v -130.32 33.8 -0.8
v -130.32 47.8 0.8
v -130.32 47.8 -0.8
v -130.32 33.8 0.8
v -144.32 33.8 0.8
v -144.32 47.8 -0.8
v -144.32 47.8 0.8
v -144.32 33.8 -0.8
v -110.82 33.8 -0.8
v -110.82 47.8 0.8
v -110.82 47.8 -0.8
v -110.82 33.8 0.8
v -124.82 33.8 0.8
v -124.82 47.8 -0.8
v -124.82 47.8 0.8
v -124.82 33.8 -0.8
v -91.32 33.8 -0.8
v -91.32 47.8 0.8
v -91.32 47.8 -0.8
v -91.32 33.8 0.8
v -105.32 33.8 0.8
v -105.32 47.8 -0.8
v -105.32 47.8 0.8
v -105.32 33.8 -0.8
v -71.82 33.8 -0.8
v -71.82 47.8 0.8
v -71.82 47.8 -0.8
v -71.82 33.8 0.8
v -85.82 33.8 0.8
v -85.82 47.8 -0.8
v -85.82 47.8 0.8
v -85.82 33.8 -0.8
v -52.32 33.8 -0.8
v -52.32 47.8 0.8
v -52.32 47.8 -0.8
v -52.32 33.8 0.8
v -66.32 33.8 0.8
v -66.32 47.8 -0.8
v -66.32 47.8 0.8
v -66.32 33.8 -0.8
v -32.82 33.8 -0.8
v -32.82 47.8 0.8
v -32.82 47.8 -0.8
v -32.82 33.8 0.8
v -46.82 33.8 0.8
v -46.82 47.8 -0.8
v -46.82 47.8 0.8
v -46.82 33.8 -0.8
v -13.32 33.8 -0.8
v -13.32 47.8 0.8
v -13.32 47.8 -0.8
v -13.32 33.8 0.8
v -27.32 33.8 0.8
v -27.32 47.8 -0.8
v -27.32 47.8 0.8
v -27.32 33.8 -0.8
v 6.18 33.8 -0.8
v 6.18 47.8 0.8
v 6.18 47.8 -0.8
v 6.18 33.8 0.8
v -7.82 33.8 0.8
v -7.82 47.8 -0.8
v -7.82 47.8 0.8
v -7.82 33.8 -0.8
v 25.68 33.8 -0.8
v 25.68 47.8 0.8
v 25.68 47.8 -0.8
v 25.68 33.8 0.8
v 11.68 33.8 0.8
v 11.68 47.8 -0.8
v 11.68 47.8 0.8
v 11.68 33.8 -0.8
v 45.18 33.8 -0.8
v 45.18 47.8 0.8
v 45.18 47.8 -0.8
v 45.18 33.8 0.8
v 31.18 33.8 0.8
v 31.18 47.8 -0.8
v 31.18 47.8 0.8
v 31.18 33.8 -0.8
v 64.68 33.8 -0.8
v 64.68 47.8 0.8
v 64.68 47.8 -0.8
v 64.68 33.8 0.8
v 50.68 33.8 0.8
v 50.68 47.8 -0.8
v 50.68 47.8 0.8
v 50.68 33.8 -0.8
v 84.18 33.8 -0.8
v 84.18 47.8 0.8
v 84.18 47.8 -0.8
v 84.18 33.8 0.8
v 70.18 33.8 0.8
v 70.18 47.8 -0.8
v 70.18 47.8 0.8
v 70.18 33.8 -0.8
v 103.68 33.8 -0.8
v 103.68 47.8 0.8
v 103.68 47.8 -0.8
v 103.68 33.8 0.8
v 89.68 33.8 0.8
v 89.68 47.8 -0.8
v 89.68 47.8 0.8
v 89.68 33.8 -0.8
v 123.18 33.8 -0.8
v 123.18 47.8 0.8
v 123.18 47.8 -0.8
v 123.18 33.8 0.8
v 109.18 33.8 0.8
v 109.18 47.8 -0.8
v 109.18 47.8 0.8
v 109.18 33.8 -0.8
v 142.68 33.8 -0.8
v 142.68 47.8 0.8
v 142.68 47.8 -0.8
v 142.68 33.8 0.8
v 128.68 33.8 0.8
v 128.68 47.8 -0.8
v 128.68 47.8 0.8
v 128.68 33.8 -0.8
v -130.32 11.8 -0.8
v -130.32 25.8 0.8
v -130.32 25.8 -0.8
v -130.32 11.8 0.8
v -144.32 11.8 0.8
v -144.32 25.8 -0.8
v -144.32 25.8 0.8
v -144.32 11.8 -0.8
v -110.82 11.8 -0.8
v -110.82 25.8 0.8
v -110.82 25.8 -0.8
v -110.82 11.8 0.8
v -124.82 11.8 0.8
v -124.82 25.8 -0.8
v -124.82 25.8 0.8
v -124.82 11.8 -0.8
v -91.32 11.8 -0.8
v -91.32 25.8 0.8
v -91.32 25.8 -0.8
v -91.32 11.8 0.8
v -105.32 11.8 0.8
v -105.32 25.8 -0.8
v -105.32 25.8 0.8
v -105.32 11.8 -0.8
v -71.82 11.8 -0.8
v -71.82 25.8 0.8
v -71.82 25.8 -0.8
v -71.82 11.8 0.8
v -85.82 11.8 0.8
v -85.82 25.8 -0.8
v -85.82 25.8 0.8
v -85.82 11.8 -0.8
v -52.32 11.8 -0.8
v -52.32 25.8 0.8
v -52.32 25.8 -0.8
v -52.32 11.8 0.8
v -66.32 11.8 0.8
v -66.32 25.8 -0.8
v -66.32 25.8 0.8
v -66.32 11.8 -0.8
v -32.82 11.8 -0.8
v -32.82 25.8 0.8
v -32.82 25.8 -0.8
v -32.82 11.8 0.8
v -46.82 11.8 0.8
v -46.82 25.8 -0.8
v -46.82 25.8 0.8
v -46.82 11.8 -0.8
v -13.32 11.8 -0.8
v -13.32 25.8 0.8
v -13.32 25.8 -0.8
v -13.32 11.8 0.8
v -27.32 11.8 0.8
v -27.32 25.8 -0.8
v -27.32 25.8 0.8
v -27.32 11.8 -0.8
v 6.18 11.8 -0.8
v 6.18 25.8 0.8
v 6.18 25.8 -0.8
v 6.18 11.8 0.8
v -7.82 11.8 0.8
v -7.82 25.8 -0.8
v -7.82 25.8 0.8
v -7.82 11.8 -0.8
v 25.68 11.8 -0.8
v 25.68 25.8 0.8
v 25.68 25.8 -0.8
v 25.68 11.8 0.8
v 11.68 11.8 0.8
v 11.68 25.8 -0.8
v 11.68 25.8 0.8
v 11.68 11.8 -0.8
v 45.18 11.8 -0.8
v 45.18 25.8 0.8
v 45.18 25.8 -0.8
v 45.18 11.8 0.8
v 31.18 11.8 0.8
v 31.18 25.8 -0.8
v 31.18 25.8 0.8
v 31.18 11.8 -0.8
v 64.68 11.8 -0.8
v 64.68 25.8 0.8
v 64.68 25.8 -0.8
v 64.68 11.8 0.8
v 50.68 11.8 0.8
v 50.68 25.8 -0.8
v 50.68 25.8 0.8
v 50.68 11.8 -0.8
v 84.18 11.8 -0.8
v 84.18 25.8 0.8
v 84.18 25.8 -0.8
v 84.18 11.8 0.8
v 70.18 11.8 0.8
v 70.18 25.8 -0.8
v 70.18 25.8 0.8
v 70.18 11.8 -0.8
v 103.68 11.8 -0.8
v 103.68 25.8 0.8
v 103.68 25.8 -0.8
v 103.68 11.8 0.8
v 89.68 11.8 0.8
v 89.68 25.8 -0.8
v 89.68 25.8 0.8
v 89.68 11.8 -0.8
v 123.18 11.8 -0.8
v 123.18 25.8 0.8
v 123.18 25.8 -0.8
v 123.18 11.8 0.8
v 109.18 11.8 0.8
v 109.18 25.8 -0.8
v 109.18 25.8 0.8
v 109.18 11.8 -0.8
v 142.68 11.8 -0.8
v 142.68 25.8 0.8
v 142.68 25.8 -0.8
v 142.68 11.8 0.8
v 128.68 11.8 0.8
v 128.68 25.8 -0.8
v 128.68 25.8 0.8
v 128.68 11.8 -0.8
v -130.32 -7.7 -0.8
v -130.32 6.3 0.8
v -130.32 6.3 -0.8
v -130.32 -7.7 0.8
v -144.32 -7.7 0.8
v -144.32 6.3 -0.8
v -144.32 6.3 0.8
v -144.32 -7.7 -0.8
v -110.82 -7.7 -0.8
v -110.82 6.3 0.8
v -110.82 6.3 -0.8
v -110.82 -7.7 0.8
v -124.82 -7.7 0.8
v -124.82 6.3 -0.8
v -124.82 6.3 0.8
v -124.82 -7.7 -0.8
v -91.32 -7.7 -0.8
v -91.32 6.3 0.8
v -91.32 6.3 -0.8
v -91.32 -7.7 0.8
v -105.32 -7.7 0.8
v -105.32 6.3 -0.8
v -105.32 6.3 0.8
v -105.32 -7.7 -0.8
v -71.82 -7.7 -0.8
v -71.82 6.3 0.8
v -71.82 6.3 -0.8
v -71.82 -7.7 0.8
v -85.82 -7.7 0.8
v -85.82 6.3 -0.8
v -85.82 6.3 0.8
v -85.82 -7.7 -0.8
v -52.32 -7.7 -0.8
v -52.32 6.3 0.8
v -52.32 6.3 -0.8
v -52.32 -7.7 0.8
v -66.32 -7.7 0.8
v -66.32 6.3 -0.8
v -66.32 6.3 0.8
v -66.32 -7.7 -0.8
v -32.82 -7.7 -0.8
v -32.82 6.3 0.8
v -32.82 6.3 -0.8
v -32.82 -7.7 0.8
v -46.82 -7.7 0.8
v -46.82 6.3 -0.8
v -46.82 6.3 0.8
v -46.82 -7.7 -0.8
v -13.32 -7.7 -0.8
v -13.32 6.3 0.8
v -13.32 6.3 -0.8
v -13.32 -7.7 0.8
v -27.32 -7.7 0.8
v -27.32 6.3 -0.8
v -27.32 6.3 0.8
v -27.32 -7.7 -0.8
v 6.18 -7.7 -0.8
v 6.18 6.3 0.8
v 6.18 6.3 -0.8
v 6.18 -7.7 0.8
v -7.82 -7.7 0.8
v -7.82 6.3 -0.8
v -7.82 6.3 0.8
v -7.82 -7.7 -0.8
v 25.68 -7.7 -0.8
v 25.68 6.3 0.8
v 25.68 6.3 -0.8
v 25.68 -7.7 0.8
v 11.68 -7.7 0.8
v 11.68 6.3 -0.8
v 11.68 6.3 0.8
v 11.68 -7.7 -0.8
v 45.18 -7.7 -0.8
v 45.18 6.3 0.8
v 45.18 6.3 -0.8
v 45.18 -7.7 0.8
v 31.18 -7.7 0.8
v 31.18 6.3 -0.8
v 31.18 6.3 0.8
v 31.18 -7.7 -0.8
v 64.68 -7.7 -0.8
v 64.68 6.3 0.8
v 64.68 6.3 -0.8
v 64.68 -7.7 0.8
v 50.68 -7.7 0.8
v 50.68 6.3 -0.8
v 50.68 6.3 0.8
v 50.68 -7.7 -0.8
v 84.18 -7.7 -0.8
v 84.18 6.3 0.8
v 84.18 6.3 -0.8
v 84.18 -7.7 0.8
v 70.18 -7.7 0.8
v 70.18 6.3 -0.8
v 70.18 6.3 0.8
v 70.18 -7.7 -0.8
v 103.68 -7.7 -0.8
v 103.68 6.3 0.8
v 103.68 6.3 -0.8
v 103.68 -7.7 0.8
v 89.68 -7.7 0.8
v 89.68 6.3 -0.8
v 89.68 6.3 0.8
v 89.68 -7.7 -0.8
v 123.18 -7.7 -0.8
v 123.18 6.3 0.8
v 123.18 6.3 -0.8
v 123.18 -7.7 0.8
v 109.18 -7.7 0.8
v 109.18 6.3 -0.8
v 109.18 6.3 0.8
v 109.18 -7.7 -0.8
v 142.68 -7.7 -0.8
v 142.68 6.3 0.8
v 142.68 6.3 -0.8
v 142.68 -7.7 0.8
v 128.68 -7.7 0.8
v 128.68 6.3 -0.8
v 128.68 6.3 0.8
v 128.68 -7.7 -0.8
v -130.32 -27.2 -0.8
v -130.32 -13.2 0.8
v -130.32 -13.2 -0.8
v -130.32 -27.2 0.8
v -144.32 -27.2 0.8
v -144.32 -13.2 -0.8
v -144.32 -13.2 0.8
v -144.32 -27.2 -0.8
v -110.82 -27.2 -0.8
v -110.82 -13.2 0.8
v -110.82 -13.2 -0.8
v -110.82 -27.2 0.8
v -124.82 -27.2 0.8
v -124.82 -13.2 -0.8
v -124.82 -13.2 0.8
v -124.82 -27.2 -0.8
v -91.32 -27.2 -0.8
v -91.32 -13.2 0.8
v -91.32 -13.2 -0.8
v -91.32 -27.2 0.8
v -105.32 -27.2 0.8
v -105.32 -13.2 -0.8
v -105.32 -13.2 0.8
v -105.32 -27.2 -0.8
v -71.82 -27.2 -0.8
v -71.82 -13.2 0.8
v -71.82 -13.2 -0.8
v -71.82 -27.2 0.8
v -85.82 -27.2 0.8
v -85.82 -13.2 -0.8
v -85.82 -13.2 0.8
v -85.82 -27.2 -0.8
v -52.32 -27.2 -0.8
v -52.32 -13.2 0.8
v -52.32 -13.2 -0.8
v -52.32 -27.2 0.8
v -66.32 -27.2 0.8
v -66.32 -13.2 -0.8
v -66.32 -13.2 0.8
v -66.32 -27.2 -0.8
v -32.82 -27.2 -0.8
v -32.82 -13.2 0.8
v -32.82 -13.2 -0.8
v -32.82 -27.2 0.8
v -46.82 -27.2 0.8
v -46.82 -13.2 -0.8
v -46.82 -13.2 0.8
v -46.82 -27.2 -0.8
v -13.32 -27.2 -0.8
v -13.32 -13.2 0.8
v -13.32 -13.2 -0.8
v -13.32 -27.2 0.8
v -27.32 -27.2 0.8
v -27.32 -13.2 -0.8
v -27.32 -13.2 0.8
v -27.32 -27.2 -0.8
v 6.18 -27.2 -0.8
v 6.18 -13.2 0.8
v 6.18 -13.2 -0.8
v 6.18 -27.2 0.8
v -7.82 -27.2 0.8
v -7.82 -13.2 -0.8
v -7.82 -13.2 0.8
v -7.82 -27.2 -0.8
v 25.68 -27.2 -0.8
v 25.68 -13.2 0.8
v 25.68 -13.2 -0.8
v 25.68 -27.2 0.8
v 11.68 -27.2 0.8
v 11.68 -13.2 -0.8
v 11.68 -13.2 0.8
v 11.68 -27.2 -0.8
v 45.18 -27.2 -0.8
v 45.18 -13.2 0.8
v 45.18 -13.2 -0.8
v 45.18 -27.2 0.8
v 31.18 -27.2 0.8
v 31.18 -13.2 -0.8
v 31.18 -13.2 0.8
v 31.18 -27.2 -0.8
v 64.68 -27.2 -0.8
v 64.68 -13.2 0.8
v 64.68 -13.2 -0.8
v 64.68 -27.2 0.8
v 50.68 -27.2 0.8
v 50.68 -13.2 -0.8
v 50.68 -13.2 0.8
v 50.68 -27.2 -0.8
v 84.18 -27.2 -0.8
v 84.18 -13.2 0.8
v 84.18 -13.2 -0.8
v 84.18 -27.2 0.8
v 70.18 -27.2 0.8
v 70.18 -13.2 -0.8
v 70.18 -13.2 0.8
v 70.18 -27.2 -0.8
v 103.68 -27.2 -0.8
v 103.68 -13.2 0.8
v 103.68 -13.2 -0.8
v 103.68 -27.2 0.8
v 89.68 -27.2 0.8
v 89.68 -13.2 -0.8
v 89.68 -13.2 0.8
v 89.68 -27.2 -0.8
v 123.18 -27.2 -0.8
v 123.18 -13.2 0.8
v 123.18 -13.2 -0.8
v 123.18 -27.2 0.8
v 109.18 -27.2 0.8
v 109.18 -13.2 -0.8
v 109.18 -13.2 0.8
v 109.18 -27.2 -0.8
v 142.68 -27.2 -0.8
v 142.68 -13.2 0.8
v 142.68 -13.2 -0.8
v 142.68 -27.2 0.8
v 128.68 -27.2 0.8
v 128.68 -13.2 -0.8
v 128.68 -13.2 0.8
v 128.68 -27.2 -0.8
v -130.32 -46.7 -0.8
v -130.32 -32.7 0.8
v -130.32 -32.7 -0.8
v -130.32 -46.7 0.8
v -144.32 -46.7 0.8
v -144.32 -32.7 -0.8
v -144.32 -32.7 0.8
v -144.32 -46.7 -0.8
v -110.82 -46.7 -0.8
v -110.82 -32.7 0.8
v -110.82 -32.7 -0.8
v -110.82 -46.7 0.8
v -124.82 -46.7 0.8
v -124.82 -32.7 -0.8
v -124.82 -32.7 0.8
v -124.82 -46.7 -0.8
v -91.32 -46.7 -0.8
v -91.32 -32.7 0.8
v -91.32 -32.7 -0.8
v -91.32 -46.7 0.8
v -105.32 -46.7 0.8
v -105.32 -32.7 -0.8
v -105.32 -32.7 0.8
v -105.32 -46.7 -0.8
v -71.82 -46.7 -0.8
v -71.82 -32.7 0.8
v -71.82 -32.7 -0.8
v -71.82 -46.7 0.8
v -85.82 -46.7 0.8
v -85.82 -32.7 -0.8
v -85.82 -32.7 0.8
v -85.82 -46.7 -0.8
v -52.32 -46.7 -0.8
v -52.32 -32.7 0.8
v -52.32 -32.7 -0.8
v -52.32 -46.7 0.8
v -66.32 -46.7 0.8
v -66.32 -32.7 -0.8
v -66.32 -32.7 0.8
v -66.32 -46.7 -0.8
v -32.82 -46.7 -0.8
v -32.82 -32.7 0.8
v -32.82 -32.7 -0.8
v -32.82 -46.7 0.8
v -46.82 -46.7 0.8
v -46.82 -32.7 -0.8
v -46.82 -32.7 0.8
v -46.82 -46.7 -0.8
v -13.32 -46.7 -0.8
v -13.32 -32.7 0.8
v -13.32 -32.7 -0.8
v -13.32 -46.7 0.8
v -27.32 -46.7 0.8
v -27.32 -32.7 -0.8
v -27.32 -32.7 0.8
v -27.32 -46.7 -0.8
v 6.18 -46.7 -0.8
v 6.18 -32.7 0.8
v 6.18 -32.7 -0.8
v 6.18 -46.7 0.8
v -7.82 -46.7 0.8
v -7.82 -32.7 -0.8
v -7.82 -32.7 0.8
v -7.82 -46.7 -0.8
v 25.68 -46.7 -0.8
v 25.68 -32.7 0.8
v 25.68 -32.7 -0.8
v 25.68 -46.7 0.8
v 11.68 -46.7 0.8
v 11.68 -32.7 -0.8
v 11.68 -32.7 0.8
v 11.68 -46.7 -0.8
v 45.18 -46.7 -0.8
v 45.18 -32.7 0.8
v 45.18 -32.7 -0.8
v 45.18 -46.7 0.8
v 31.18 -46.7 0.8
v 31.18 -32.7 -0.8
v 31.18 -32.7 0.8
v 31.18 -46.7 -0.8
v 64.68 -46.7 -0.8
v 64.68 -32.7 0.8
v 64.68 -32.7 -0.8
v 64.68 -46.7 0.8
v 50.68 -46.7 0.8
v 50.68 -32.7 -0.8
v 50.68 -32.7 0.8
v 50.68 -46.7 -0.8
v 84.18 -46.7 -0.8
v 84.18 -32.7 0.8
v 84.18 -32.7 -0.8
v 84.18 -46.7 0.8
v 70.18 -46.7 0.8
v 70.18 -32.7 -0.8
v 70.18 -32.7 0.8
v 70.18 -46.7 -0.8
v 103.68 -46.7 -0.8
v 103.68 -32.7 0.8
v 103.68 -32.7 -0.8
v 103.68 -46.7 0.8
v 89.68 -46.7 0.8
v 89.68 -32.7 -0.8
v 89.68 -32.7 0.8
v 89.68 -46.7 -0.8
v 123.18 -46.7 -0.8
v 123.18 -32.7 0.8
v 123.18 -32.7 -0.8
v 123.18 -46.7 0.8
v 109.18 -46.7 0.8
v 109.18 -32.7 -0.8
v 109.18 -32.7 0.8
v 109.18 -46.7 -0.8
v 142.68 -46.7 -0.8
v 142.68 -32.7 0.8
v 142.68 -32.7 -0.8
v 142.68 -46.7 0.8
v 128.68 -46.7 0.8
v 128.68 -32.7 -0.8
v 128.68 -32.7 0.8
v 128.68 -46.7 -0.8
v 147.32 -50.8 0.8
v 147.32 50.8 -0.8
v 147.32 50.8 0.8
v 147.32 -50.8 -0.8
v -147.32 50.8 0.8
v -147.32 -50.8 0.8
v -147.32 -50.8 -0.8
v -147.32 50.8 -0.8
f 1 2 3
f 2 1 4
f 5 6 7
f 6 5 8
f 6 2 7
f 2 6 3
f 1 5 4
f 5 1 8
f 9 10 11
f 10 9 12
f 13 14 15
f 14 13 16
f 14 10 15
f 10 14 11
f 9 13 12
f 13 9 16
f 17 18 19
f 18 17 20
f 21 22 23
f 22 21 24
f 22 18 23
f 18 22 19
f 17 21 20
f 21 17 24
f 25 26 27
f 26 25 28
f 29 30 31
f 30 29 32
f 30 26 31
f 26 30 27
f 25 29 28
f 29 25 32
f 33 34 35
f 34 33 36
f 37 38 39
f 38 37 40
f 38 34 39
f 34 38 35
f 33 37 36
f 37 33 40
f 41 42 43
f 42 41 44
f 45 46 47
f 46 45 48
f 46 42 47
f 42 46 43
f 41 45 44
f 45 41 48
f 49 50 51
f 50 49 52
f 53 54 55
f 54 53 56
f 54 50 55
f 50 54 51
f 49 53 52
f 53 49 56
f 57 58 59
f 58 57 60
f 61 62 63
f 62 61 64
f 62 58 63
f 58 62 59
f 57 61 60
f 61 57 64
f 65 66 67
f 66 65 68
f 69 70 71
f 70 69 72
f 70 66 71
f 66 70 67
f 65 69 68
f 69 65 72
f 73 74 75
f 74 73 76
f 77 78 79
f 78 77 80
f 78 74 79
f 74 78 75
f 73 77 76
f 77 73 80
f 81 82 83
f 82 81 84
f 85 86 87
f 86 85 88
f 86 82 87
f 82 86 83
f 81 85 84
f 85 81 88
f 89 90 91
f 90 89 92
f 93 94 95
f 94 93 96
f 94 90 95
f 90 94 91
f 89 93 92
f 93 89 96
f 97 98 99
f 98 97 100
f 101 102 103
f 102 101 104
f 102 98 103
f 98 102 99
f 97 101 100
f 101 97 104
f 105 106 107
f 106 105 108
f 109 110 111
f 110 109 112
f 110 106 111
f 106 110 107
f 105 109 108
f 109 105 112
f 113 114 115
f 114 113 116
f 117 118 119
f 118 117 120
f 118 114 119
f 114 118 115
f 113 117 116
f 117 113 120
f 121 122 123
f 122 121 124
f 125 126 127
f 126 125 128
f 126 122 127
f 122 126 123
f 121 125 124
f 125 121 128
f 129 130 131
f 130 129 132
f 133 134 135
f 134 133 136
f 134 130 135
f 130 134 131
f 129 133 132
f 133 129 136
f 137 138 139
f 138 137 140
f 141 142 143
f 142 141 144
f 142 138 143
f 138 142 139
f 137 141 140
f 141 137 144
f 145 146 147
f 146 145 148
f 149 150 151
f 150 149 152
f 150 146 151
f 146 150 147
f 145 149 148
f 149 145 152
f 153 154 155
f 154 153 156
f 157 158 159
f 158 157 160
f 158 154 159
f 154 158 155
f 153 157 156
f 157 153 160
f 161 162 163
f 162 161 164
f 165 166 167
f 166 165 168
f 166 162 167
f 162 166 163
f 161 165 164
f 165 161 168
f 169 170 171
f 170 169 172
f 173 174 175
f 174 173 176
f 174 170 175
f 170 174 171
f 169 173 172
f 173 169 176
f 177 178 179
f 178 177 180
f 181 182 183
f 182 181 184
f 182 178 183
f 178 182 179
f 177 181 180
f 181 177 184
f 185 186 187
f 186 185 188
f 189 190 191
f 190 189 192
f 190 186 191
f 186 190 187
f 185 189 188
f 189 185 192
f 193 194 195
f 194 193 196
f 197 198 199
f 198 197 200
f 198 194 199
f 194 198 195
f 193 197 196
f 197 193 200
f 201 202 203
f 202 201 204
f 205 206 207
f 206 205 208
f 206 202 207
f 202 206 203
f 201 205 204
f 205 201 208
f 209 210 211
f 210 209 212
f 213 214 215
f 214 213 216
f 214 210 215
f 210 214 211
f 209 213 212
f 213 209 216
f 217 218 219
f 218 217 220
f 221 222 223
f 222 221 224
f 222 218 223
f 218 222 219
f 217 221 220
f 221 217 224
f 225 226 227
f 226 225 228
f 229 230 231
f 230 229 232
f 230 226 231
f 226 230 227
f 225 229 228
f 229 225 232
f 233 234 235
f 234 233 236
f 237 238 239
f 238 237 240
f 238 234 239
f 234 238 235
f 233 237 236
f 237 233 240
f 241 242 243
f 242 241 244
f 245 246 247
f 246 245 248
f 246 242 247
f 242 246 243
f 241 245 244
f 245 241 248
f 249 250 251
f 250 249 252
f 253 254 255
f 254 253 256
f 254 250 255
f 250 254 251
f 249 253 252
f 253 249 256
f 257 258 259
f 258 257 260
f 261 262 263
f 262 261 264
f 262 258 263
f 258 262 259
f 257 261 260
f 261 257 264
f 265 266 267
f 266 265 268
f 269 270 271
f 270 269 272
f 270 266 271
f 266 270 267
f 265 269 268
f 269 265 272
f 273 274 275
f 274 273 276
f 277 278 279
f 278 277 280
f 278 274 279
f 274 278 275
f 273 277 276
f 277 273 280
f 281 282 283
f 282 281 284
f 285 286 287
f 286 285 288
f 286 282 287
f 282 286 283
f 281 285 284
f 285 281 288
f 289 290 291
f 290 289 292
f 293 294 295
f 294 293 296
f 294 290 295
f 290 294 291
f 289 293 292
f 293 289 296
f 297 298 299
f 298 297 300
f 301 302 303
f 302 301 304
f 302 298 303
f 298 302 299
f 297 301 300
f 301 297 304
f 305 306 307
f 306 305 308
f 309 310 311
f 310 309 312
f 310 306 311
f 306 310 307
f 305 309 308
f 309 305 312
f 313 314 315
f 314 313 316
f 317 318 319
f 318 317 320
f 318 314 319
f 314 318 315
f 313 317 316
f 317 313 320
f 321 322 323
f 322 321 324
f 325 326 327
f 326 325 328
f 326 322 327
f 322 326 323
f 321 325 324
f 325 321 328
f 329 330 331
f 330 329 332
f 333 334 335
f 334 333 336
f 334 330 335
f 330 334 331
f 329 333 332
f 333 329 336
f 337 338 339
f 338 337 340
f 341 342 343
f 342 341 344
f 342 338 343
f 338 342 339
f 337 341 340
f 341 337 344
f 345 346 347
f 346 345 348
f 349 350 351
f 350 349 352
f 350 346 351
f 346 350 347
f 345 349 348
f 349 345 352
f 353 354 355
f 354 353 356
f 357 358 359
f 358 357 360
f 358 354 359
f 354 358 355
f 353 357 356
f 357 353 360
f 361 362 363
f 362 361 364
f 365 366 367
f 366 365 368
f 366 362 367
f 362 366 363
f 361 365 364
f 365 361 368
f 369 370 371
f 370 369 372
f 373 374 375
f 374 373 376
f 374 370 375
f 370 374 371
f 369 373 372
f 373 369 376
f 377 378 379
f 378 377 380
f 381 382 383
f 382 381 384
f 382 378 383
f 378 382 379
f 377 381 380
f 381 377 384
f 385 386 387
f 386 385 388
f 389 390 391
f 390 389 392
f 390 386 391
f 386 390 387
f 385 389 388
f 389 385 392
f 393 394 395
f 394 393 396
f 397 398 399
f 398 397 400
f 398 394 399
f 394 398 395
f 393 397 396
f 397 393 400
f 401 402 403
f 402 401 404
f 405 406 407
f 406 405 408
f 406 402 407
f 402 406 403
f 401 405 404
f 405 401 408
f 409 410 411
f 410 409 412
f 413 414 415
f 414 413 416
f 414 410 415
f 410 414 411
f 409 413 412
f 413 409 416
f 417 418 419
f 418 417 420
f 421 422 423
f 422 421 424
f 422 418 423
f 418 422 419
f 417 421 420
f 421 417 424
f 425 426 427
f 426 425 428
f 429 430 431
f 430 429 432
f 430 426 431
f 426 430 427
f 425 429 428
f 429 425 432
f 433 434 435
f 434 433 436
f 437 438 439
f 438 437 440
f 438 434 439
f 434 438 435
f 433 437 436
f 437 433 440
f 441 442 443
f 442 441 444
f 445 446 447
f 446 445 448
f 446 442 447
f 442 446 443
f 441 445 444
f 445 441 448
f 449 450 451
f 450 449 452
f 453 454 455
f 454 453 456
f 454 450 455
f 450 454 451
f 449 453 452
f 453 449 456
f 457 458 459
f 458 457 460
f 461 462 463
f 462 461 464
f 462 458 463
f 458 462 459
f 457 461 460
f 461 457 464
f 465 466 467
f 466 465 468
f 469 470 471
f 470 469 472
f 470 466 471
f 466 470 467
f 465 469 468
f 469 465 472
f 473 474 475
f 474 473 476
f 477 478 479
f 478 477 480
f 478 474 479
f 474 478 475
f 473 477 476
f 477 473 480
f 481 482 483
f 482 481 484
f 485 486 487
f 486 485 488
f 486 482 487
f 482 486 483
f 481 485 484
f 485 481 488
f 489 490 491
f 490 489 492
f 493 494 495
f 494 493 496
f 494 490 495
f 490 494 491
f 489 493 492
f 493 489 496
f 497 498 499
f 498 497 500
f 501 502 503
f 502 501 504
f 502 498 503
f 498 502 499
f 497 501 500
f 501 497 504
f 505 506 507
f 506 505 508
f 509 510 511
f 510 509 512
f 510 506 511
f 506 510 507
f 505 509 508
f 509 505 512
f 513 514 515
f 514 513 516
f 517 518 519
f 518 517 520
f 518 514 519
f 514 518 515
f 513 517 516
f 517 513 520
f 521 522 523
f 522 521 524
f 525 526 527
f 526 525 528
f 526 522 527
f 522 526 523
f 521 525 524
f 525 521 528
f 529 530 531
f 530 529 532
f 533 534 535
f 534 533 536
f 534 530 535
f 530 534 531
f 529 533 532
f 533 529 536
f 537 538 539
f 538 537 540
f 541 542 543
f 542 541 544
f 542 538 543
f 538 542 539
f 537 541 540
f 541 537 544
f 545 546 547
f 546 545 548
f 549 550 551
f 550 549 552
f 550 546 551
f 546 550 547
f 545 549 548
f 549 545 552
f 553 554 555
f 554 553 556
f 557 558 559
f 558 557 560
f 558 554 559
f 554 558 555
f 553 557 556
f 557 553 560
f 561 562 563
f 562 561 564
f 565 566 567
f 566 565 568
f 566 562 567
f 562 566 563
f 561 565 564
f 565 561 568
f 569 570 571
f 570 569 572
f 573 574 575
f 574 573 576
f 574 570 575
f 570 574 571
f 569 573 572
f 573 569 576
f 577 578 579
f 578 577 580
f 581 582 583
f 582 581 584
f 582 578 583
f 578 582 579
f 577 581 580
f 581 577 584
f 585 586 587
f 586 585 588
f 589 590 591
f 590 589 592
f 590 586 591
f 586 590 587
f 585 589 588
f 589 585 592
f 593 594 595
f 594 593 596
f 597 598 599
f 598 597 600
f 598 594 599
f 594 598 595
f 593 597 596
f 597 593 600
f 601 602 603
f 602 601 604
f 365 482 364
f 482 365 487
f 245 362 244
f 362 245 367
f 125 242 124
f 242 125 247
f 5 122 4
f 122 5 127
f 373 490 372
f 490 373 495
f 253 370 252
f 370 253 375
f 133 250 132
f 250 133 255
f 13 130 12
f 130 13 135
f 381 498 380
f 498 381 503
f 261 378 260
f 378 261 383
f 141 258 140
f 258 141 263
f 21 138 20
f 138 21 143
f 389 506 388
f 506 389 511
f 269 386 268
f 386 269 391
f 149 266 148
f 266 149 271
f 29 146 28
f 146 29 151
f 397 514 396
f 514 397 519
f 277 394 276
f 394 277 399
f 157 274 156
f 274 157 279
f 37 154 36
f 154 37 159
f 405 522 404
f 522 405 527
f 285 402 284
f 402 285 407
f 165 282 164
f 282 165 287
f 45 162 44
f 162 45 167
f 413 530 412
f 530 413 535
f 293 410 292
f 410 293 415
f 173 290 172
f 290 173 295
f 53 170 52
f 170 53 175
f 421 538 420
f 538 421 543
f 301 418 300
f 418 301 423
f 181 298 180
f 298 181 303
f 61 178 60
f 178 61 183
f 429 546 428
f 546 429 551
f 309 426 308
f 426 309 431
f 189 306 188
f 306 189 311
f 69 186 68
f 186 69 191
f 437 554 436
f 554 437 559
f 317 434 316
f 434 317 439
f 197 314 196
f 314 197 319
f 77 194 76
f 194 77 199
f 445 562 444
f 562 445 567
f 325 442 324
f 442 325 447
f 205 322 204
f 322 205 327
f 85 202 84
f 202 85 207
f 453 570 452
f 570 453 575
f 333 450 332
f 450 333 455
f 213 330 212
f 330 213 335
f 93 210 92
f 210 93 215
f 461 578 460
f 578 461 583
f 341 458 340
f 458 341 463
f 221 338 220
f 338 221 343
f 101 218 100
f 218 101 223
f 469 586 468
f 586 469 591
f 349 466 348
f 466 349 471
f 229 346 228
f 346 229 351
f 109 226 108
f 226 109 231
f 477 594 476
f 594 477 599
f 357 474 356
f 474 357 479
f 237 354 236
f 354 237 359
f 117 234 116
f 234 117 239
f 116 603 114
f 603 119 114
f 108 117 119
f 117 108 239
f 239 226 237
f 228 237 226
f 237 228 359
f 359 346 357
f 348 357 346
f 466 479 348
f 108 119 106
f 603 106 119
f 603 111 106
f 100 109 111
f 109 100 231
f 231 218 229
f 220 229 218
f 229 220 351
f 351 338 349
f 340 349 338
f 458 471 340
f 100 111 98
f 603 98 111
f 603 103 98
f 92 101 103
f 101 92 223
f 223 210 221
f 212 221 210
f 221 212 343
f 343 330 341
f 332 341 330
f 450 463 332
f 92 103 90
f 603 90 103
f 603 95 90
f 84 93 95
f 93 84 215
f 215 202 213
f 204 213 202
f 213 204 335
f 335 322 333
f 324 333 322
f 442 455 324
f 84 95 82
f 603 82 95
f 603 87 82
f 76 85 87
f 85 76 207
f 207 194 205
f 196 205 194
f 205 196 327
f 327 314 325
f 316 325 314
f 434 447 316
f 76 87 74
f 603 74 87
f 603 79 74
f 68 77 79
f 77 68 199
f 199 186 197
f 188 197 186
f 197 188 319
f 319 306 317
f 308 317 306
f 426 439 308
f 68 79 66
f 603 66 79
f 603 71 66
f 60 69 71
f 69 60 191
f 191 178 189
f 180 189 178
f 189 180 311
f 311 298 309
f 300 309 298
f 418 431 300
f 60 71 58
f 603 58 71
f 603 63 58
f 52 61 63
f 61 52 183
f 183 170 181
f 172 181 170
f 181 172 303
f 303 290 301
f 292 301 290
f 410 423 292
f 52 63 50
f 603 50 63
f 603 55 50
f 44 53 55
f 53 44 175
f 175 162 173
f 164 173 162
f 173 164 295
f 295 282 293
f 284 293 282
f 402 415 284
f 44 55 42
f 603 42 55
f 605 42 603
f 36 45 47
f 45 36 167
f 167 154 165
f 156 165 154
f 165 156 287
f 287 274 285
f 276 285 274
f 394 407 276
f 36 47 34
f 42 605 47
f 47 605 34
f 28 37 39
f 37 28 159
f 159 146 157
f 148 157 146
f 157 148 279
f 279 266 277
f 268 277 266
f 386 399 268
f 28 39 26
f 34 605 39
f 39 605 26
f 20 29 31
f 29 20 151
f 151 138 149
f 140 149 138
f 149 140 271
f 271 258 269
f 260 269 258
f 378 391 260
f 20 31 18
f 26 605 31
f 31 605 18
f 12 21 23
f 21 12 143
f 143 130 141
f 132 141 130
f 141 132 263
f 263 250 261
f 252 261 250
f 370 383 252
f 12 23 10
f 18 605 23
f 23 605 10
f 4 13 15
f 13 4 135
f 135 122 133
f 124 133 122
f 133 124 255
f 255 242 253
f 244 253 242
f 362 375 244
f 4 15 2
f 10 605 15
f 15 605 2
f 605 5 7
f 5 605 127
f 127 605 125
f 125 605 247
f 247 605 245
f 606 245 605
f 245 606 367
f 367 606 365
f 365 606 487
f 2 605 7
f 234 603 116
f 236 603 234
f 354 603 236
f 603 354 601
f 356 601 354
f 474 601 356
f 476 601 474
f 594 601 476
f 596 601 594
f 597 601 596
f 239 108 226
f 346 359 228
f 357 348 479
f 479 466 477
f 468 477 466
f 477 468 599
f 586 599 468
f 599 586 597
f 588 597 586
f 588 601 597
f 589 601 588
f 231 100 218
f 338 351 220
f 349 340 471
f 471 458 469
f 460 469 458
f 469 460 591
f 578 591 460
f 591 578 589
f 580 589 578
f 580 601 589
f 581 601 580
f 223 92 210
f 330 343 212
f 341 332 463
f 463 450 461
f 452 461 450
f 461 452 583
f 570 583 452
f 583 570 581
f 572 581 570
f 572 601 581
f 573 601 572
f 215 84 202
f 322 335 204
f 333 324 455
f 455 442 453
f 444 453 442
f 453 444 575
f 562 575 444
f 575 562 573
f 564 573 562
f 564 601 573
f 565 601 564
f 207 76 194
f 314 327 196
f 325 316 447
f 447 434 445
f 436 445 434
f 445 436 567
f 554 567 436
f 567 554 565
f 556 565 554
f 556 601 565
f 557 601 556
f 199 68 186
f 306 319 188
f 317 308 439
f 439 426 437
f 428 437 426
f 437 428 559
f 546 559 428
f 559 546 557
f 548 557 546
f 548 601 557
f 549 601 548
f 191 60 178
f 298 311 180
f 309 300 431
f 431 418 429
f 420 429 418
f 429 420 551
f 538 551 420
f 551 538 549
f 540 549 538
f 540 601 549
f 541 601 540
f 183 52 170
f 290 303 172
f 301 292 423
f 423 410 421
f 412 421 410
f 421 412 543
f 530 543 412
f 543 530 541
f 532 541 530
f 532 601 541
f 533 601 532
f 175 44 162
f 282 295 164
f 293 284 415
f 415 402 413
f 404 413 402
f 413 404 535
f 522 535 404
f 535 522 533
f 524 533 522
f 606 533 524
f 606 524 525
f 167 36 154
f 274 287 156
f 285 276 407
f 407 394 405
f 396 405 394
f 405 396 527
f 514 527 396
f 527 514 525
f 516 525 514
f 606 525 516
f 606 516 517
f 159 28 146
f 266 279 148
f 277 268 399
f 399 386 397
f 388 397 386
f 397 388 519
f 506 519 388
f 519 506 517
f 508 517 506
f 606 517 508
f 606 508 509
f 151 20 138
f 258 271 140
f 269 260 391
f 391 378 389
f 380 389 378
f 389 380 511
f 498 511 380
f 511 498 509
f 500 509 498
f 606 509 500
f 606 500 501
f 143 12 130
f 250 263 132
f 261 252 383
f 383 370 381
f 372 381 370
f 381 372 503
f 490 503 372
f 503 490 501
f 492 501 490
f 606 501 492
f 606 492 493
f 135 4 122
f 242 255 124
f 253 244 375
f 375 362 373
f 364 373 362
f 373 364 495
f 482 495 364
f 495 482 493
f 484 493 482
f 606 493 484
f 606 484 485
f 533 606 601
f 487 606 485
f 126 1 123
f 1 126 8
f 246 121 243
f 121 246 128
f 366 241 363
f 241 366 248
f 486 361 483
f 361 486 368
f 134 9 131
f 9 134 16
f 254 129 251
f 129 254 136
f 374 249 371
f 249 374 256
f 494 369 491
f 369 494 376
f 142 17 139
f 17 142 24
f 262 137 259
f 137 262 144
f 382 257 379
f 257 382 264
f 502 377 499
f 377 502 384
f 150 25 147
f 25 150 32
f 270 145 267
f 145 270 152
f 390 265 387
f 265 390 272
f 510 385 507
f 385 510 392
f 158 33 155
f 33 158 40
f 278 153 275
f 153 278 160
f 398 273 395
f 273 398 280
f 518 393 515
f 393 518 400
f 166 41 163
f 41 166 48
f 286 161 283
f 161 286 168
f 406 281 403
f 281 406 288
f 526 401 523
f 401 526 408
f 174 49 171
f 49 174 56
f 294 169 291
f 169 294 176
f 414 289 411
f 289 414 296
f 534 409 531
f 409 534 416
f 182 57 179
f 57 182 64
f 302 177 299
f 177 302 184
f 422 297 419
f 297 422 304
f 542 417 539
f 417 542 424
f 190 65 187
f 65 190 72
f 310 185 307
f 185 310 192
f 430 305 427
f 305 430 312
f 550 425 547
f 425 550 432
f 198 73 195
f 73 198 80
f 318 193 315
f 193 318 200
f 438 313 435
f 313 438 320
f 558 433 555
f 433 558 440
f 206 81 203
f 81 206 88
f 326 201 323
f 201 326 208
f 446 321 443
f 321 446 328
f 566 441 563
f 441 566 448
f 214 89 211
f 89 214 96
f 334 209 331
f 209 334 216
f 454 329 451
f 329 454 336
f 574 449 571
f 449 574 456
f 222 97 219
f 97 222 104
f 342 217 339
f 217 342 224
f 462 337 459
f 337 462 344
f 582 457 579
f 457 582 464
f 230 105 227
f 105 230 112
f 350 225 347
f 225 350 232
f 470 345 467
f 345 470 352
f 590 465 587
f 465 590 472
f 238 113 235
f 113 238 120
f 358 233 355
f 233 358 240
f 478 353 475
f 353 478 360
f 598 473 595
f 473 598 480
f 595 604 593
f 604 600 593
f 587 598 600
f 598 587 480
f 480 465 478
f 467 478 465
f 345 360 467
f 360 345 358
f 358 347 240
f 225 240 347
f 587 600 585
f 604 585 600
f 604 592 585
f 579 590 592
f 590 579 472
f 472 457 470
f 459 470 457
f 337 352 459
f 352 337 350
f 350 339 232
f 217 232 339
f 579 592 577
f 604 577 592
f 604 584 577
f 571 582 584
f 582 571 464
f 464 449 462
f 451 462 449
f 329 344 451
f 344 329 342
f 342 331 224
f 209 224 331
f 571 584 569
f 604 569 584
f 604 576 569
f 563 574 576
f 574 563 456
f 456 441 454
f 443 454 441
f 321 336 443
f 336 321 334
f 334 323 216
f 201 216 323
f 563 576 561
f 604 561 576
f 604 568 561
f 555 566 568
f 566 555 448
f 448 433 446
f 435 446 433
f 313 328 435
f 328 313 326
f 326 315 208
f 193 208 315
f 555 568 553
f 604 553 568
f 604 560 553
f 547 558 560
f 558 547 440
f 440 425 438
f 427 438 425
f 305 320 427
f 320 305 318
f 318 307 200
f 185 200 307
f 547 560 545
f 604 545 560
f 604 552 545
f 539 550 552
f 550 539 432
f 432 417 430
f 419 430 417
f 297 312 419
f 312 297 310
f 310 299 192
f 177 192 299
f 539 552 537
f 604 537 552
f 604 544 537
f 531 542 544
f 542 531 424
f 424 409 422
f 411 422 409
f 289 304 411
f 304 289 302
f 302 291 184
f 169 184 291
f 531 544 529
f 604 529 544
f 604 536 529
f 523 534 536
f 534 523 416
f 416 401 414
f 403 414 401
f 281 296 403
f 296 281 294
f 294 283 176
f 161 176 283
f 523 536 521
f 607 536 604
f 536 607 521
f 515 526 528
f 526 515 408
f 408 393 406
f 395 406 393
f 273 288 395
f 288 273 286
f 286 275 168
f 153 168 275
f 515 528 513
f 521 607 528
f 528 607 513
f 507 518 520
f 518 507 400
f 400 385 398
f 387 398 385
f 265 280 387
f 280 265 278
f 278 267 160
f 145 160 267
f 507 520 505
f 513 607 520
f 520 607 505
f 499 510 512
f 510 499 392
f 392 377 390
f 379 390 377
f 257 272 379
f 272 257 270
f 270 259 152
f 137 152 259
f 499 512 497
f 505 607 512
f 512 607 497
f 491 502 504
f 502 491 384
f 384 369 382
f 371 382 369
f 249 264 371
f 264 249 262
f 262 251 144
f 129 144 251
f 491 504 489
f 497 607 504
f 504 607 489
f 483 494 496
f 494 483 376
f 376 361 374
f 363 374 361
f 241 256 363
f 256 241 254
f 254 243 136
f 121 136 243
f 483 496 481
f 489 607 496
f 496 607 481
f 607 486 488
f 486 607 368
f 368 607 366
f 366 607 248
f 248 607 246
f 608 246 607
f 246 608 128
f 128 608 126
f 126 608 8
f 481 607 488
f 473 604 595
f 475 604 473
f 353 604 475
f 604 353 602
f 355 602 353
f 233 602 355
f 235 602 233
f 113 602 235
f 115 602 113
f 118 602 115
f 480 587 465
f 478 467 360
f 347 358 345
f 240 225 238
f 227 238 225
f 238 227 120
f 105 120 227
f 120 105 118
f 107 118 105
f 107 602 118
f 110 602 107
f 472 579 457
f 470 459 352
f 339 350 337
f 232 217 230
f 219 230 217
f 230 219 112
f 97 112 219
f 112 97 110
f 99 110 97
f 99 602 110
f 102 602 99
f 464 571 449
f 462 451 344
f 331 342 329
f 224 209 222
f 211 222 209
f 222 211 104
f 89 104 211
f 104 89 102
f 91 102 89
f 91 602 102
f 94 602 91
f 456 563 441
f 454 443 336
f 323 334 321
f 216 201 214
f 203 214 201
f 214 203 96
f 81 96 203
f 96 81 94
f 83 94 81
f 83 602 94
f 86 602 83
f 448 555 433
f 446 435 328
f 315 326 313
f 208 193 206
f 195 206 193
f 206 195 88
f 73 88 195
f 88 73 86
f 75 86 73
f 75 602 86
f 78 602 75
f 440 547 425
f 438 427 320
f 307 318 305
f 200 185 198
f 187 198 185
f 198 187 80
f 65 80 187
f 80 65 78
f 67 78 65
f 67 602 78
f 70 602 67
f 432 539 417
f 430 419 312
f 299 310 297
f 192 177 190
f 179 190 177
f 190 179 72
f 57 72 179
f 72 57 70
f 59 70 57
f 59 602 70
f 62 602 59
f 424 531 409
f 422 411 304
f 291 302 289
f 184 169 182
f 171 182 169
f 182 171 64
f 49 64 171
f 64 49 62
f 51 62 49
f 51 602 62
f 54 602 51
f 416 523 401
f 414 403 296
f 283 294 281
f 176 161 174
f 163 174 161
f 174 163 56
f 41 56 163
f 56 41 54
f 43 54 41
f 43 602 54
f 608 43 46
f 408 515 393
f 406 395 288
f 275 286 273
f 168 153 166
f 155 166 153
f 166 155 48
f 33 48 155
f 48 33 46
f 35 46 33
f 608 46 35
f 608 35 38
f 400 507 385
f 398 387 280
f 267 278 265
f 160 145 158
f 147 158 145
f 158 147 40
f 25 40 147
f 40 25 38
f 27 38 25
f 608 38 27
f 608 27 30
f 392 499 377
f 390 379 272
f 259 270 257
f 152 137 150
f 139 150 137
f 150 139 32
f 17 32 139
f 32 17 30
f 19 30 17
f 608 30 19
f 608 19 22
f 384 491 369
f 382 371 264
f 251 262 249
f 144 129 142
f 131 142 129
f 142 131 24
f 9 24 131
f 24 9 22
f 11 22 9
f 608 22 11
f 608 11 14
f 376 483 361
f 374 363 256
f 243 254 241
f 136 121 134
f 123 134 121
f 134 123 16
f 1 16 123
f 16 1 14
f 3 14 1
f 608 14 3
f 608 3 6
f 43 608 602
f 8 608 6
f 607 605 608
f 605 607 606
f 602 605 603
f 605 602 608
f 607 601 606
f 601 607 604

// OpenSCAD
top_plate_height = 1.6;
top_plate_width = 101.60;
top_plate_length = 294.64;

cherry_switch_length = 15.6;
cherry_switch_width = 15.6;
cherry_switch_housing_height = 6.6;
cherry_switch_housing_height = 5.0;
cherry_switch_switch_height = 3.6;

switch_cutout_width = 14.0;
switch_cutout_length = 14.0;
switch_cutout_pitch = switch_cutout_width + 5.5;

plate_height_spacing = 5.0 + 0.3;

union() {
    top_plate();
}

module top_plate() {
    top_plate_x = 0;
    top_plate_y = 0;
    top_plate_z = 0;

    difference() {
        translate([top_plate_x, top_plate_y, top_plate_z])
            color("gray", 1.0)
            cube([top_plate_length,
                  top_plate_width,
                  top_plate_height],
                 center = true);
        union() {
            row_1_switch_cutout();
            row_2_switch_cutout();
            row_3_switch_cutout();
            row_4_switch_cutout();
            row_5_switch_cutout();
        }
    }
}

module uniform_row_switch_cutout(start_y_offset) {
    cutout_count = 14;

    start_x_offset = -(top_plate_length / 2) + 3.0;
    start_z_offset = -2.0;

    for (x = [0:cutout_count]) {
        translate([start_x_offset + (x * switch_cutout_pitch),
                   start_y_offset,
                   start_z_offset])
            cube([switch_cutout_length,
                  switch_cutout_width,
                  10.0]);
    }
}

module row_1_switch_cutout() {
    start_y_offset = (top_plate_width / 2) - switch_cutout_width - 3.0;
    uniform_row_switch_cutout(start_y_offset);
}

module row_2_switch_cutout() {
    start_y_offset = (top_plate_width / 2) - (switch_cutout_pitch * 2);
    uniform_row_switch_cutout(start_y_offset);
}

module row_3_switch_cutout() {
    start_y_offset = (top_plate_width / 2) - (switch_cutout_pitch * 3);
    uniform_row_switch_cutout(start_y_offset);
}

module row_4_switch_cutout() {
    start_y_offset = (top_plate_width / 2) - (switch_cutout_pitch * 4);
    uniform_row_switch_cutout(start_y_offset);
}

module row_5_switch_cutout() {
    start_y_offset = (top_plate_width / 2) - (switch_cutout_pitch * 5);
    uniform_row_switch_cutout(start_y_offset);
}

module cherry_mx_cutout(x, y, z) {
}

module cherry_mx_switch(x, y, z) {
    
}
